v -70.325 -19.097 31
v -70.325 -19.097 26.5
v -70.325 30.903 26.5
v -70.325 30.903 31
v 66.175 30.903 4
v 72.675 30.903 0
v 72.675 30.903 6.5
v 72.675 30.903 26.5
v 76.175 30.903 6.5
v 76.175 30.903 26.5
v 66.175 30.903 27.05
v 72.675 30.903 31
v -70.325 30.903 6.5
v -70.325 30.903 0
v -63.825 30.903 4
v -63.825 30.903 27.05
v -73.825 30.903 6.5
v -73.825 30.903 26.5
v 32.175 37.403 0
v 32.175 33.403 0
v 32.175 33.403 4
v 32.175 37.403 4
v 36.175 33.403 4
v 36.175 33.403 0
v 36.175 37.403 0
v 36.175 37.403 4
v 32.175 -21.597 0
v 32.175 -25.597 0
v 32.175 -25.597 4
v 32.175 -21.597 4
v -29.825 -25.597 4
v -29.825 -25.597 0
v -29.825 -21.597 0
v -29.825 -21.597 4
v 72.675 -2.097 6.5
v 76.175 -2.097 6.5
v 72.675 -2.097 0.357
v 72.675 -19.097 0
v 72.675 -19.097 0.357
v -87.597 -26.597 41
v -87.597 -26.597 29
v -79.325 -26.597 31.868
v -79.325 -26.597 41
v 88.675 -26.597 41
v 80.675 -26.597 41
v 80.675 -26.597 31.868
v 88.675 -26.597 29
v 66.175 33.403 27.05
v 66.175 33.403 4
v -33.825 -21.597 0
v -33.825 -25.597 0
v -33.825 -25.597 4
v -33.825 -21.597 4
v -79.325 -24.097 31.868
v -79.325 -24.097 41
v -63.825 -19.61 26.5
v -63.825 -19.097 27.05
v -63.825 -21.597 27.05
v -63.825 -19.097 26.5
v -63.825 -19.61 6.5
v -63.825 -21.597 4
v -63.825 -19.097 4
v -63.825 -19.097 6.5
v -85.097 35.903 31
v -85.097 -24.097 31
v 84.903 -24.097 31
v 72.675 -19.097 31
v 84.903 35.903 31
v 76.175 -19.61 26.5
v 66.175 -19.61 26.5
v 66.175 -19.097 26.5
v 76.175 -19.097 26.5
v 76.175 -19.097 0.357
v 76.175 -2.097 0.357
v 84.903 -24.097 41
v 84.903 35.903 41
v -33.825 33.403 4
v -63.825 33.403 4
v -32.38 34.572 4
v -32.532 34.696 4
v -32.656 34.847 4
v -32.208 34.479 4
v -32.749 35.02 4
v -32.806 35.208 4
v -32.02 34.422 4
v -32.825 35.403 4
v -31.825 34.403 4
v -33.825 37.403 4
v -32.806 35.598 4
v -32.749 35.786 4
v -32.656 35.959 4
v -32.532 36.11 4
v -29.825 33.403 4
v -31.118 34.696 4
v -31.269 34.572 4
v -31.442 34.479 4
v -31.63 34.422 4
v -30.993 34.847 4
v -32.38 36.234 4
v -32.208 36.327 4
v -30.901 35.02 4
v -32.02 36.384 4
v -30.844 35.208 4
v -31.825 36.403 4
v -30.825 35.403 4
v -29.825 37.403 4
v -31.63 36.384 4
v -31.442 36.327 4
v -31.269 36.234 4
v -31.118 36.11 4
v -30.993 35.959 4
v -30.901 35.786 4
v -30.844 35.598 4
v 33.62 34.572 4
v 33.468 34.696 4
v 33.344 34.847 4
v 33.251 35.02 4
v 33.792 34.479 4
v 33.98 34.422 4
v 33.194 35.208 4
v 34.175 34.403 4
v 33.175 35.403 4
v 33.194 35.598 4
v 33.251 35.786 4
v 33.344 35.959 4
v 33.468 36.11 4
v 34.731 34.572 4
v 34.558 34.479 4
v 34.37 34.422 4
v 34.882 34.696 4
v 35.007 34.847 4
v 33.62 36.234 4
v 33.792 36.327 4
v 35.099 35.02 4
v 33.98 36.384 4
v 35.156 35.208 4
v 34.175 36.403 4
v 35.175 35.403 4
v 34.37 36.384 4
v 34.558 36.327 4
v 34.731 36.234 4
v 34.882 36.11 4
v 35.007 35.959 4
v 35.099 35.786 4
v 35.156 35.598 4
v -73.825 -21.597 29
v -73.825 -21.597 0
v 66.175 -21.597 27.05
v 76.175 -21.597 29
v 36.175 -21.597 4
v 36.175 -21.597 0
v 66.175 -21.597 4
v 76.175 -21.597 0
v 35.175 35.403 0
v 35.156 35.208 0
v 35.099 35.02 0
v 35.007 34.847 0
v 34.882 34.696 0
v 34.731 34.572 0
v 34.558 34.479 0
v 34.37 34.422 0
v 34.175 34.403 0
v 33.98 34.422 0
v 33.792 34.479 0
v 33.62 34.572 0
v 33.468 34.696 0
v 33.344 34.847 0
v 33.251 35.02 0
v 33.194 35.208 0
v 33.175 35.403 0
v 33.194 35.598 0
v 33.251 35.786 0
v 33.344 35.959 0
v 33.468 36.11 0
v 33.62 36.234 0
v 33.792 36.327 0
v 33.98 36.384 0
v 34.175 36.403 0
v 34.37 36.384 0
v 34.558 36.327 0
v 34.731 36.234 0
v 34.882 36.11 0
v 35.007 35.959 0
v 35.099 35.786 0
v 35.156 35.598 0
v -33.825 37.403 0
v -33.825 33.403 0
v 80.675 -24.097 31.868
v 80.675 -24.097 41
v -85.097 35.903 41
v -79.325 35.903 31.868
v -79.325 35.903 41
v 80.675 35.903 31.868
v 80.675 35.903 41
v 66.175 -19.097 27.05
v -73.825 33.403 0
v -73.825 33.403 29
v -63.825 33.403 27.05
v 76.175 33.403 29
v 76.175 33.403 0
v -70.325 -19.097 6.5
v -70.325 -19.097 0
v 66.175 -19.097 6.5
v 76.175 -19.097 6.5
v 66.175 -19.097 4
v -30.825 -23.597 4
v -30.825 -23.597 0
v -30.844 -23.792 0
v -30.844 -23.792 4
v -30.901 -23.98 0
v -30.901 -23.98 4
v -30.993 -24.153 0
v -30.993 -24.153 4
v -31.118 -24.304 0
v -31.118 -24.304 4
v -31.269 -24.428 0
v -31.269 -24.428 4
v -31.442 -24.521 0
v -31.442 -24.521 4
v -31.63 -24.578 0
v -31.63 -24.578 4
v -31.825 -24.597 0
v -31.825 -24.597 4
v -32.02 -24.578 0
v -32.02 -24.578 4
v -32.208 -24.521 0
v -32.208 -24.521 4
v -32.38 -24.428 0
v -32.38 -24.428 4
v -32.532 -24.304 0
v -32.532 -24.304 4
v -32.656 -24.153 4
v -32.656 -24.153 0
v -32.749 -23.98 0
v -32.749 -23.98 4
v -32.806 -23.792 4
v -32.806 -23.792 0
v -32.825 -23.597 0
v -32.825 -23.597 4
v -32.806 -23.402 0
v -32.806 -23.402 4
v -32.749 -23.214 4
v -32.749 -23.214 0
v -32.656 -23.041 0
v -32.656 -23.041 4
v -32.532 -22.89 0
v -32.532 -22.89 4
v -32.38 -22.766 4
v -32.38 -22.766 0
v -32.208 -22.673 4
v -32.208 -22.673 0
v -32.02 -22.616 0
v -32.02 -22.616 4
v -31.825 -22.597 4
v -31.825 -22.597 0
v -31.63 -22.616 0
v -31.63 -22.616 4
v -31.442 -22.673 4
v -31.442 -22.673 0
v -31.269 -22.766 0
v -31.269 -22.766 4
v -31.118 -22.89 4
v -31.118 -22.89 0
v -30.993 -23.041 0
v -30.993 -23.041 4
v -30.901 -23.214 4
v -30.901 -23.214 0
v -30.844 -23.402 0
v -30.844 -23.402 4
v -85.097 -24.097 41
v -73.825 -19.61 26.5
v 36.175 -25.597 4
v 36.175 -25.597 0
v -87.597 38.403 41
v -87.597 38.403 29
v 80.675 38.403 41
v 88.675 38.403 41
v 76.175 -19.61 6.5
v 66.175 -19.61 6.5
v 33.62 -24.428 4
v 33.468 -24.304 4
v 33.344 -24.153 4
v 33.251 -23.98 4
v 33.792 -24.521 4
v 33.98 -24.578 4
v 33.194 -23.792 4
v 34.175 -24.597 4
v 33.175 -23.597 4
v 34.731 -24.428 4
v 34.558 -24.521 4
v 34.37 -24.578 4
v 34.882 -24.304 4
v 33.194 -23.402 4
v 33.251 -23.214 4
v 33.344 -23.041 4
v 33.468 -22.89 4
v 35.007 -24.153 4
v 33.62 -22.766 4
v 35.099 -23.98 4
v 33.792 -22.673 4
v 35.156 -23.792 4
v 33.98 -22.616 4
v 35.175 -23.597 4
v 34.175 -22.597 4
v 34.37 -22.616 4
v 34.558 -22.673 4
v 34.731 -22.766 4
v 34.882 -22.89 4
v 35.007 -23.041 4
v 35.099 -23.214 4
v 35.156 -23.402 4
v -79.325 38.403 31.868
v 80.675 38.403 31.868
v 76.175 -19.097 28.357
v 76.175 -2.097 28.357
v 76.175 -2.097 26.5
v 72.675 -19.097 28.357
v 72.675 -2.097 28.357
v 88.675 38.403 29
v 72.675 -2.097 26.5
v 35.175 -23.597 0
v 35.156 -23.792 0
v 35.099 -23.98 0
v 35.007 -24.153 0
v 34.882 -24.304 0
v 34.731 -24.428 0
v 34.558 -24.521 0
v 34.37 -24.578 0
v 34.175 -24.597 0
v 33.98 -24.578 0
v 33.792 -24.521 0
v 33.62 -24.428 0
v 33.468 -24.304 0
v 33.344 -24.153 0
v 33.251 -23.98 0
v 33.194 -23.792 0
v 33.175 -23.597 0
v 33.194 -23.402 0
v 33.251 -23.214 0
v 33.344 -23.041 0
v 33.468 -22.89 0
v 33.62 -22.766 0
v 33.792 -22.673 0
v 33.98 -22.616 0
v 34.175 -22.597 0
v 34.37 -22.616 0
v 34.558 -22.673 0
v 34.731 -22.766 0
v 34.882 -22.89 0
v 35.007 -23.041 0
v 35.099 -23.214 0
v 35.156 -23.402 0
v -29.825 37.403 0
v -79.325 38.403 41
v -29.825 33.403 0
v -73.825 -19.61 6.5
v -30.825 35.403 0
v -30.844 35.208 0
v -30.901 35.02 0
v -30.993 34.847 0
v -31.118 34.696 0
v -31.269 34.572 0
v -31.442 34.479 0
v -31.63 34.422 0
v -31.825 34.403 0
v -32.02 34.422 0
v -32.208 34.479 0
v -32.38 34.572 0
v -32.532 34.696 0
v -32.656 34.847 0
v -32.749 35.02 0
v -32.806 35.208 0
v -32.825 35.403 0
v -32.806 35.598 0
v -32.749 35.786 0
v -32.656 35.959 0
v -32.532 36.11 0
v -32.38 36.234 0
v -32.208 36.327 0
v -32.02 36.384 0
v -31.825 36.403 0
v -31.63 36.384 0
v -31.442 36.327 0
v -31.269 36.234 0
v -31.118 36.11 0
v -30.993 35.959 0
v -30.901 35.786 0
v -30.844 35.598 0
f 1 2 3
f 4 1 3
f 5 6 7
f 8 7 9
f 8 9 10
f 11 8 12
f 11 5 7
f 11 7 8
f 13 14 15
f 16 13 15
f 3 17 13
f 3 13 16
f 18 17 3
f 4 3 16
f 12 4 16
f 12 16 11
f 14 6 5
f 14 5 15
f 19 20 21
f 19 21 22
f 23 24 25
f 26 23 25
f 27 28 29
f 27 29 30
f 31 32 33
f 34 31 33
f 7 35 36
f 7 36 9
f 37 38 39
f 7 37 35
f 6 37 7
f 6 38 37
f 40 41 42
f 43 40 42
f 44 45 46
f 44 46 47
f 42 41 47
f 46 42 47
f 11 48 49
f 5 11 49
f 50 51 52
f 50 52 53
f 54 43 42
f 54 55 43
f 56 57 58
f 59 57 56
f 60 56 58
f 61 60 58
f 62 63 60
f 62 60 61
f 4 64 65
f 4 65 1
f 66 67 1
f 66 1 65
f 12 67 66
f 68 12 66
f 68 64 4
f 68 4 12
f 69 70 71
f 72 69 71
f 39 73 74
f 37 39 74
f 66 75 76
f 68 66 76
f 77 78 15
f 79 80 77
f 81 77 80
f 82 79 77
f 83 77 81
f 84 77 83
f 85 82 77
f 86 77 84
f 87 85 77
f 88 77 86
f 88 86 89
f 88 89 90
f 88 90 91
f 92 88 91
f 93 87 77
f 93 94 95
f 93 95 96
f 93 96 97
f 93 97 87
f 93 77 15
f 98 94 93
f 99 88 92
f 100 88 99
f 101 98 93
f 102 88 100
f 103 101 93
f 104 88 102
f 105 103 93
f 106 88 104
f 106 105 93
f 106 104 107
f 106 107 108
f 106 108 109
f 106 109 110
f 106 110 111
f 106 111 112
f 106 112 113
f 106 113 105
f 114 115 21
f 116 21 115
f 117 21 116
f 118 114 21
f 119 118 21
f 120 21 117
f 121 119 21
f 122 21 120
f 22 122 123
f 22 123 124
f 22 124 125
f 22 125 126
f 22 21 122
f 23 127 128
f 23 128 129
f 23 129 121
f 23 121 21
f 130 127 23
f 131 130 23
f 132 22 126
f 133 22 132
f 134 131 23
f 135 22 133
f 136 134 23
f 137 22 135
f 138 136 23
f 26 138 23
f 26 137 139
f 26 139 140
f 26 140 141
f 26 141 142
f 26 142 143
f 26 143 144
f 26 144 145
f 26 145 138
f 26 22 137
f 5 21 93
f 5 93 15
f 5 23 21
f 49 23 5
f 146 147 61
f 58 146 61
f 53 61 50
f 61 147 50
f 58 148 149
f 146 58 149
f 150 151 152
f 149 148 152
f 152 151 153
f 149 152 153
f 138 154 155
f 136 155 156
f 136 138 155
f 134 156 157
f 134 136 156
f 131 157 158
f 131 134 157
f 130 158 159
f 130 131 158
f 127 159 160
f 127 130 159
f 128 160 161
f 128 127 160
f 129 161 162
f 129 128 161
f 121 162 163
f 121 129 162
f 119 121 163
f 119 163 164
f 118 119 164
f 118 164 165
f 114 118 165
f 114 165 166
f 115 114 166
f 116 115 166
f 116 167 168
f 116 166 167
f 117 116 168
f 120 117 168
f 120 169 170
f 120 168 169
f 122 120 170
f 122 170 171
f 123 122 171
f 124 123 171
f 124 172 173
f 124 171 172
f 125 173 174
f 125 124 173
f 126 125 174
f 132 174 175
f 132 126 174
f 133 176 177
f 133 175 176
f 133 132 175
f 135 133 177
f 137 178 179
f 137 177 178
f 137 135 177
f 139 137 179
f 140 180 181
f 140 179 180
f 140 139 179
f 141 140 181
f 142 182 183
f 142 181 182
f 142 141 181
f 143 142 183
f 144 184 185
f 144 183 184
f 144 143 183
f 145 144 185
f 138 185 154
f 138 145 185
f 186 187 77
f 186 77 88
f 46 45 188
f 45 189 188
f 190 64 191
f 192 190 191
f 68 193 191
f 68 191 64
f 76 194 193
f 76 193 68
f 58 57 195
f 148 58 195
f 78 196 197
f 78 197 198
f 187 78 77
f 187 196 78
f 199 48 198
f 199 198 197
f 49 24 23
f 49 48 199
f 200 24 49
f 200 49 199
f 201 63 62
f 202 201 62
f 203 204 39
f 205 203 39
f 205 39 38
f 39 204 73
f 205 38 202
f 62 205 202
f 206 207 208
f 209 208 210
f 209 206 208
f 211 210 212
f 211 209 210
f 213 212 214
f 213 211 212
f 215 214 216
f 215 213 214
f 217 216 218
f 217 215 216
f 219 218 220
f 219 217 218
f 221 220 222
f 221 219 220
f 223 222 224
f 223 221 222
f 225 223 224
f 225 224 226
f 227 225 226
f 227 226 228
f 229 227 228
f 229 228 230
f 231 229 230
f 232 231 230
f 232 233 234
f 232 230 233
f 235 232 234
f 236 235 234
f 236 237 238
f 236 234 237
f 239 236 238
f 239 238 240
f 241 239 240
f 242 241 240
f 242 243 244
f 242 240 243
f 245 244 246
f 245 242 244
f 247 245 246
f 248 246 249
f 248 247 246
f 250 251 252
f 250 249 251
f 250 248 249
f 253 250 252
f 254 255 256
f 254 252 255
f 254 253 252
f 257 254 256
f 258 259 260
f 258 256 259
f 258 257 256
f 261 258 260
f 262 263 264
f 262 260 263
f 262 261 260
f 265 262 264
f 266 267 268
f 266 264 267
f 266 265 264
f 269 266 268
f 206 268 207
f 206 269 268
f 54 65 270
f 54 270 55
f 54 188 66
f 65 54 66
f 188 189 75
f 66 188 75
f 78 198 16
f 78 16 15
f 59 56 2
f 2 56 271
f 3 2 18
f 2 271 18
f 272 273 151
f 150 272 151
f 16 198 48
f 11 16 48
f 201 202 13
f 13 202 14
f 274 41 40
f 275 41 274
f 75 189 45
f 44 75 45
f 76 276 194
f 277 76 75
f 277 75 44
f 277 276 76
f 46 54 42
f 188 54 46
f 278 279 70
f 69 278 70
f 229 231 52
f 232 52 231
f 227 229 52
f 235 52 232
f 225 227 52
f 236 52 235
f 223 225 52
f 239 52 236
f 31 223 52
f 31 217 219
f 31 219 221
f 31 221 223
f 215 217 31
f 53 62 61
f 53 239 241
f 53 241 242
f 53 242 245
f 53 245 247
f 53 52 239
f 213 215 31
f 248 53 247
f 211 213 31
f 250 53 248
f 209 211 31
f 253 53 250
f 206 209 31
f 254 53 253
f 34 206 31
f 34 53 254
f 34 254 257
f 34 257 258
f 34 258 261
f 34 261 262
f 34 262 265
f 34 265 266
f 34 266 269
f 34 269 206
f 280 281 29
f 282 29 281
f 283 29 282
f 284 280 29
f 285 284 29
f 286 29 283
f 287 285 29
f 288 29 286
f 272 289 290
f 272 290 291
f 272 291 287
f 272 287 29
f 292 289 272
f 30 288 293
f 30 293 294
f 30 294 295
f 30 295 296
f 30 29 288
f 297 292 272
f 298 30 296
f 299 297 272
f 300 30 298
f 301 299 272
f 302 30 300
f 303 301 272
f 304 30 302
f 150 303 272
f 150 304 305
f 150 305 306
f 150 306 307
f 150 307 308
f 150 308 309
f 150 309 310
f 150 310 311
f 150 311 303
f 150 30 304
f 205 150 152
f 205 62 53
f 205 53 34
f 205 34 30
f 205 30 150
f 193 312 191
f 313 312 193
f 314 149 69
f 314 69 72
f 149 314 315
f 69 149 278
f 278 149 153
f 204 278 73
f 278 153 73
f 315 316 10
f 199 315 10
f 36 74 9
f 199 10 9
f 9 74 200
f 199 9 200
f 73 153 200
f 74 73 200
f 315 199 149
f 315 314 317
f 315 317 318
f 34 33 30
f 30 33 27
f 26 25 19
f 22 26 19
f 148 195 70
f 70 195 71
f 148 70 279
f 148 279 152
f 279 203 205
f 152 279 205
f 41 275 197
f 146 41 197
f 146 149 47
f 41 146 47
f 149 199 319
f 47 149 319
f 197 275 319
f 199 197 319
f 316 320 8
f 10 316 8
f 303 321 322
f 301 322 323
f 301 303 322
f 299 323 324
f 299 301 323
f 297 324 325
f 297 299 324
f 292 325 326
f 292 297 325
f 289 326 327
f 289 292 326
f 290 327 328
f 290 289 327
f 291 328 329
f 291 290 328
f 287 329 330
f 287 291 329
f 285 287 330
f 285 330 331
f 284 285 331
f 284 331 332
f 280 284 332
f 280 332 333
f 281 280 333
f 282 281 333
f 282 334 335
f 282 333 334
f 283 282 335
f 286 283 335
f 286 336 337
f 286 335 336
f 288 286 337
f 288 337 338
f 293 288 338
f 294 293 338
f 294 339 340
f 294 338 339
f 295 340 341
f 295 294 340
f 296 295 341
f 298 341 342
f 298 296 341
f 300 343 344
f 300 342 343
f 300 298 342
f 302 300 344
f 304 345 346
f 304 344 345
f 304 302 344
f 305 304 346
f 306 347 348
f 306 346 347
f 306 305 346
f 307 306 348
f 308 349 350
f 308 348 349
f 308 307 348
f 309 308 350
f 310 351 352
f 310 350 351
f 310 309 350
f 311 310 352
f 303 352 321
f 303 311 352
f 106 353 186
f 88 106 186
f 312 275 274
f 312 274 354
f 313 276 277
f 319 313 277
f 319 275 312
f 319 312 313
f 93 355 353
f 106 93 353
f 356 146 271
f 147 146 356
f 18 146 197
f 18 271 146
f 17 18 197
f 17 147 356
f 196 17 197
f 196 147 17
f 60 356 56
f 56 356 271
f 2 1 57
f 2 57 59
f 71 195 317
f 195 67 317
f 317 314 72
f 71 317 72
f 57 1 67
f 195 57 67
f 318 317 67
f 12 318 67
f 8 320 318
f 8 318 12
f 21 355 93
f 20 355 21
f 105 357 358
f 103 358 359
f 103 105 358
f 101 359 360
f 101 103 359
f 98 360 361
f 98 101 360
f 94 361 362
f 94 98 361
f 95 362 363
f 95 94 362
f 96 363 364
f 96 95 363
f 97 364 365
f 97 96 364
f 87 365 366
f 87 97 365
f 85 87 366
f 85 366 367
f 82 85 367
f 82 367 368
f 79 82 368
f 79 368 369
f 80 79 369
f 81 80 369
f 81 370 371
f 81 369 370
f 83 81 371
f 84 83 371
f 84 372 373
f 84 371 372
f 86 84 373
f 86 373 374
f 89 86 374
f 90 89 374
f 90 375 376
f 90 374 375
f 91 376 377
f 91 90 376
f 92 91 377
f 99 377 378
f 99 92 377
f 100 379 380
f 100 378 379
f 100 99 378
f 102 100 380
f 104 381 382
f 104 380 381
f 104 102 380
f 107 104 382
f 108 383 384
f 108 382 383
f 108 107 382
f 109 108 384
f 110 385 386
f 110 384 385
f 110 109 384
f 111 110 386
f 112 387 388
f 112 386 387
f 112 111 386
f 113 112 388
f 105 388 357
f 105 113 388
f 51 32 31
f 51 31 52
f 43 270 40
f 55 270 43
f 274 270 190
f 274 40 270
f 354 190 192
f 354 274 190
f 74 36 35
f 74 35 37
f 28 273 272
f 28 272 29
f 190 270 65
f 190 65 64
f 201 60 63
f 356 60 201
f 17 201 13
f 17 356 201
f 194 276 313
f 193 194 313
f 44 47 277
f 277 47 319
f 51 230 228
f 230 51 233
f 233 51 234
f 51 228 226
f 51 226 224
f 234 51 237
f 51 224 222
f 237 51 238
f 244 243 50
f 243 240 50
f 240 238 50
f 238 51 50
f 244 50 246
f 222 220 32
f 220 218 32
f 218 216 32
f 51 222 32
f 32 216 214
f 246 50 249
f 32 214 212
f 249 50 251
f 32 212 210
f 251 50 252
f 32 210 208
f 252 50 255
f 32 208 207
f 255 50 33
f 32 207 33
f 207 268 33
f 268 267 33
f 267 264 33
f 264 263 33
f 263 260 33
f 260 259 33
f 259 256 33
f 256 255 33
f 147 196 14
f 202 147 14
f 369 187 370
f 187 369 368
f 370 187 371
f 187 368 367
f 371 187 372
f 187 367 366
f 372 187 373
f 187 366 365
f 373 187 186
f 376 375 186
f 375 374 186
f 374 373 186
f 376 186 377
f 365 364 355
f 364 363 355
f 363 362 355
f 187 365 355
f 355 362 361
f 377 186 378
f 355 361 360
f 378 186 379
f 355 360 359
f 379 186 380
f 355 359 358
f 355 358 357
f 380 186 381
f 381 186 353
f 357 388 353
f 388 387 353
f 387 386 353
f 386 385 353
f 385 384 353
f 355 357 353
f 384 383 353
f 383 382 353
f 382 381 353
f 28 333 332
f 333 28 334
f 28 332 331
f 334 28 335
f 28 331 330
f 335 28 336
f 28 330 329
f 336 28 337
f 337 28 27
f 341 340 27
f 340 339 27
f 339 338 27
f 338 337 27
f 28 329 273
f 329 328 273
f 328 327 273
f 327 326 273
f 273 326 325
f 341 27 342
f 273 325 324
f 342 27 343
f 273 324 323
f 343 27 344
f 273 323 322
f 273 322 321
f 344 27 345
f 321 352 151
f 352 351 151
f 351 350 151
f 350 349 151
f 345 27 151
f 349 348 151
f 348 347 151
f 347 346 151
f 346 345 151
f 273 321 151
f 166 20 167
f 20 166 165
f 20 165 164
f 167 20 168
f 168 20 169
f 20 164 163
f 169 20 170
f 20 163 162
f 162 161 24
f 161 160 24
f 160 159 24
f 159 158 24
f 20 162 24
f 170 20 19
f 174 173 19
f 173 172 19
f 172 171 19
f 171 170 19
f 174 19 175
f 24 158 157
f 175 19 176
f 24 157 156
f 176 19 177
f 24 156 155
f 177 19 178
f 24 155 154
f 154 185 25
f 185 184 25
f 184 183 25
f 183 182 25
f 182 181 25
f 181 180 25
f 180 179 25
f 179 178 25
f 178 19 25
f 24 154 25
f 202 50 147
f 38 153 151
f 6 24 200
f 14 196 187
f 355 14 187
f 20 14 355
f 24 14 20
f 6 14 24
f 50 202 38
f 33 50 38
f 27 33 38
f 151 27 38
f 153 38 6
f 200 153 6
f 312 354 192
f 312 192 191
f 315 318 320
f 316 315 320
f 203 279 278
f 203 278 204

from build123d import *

# Parameters (mm, degrees)
SKETCH1_W               = 150
SKETCH1_H               = 55
SKETCH1_W_2             = 143
SKETCH1_H_2             = 50
BOSS_EXTRUDE1_DEPTH     = 30
CUT_EXTRUDE6_DEPTH      = 46
CUT_EXTRUDE6_DEPTH_BACK = 1
SKETCH2_W               = 170
SKETCH2_H               = 60
SKETCH3_W               = 176.272583165
SKETCH3_H               = 65
BOSS_EXTRUDE3_DEPTH     = 12
SKETCH4_W               = 170
SKETCH4_H               = 60
CUT_EXTRUDE7_DEPTH      = 10
CUT_EXTRUDE8_DEPTH      = 102.484371807
CUT_EXTRUDE8_DEPTH_BACK = 102.484371807
SKETCH5_W               = 143
SKETCH5_H               = 50
SKETCH6_W               = 4
SKETCH6_H               = 4
BOSS_EXTRUDE5_DEPTH     = 4
CUT_EXTRUDE9_DEPTH      = 105.971794883
CUT_EXTRUDE9_DEPTH_BACK = 4
SKETCH7_R               = 1
SKETCH8_W               = 28
SKETCH8_H               = 17
CUT_EXTRUDE12_DEPTH     = 10
SKETCH9_W               = 130
SKETCH9_H               = 23.050427834
CUT_EXTRUDE13_DEPTH     = 72
SKETCH10_W              = 20
SKETCH10_H              = 50.513415504
CUT_EXTRUDE14_DEPTH     = 177
SKETCH11_W              = 160
SKETCH11_H              = 10.657938717
CUT_EXTRUDE15_DEPTH     = 177


with BuildPart() as part:
    # Sketch1 → Boss-Extrude1 (new body)
    with BuildSketch(Plane.XY):
        with Locations((1.175180371, 5.902996071)):
            Rectangle(SKETCH1_W, SKETCH1_H)
        with Locations((1.175180371, 5.902996071)):
            Rectangle(SKETCH1_W_2, SKETCH1_H_2, mode=Mode.SUBTRACT)
    extrude(amount=BOSS_EXTRUDE1_DEPTH)

    # Sketch2 → Cut-Extrude6 (cut, two sides: drawn at the far end of the back side and taken through both)
    with BuildSketch(Plane.XY.offset(30).offset(-CUT_EXTRUDE6_DEPTH_BACK)):
        with Locations((1.175180371, 5.902996071)):
            Rectangle(SKETCH2_W, SKETCH2_H)
    extrude(amount=CUT_EXTRUDE6_DEPTH + CUT_EXTRUDE6_DEPTH_BACK, mode=Mode.SUBTRACT)

    # Sketch3 → Boss-Extrude3 (add)
    with BuildSketch(Plane.XY.offset(29)):
        with Locations((0.538888789, 5.902996071)):
            Rectangle(SKETCH3_W, SKETCH3_H)
    extrude(amount=BOSS_EXTRUDE3_DEPTH)

    # Sketch4 → Cut-Extrude7 (cut)
    with BuildSketch(Plane.XY.offset(41)):
        with Locations((-0.097402794, 5.902996071)):
            Rectangle(SKETCH4_W, SKETCH4_H)
    extrude(amount=-CUT_EXTRUDE7_DEPTH, mode=Mode.SUBTRACT)

    # Sketch5 → Cut-Extrude8 (cut, two sides: drawn at the far end of the back side and taken through both)
    with BuildSketch(Plane.XY.offset(31).offset(-CUT_EXTRUDE8_DEPTH_BACK)):
        with Locations((1.175180371, 5.902996071)):
            Rectangle(SKETCH5_W, SKETCH5_H)
    extrude(amount=CUT_EXTRUDE8_DEPTH + CUT_EXTRUDE8_DEPTH_BACK, mode=Mode.SUBTRACT)

    # Sketch6 → Boss-Extrude5 (add)
    with BuildSketch(Plane(origin=(0, 0, 0), x_dir=(-1, 0, 0), z_dir=(0, 0, -1))):
        with Locations((-34.175180371, -23.597003929)):
            Rectangle(SKETCH6_W, SKETCH6_H)
        with Locations((31.824819629, -23.597003929)):
            Rectangle(SKETCH6_W, SKETCH6_H)
        with Locations((-34.175180371, 35.402996071)):
            Rectangle(SKETCH6_W, SKETCH6_H)
        with Locations((31.824819629, 35.402996071)):
            Rectangle(SKETCH6_W, SKETCH6_H)
    extrude(amount=-BOSS_EXTRUDE5_DEPTH)

    # Sketch7 → Cut-Extrude9 (cut, two sides: drawn at the far end of the back side and taken through both)
    with BuildSketch(Plane(origin=(0, 0, 0), x_dir=(-1, 0, 0), z_dir=(0, 0, -1)).offset(-CUT_EXTRUDE9_DEPTH_BACK)):
        with Locations(Location((-34.175180371, 35.402996071, 0), (0, 0, 180))):
            Circle(SKETCH7_R)
        with Locations(Location((31.824819629, 35.402996071, 0), (0, 0, 180))):
            Circle(SKETCH7_R)
        with Locations(Location((31.824819629, -23.597003929, 0), (0, 0, 180))):
            Circle(SKETCH7_R)
        with Locations(Location((-34.175180371, -23.597003929, 0), (0, 0, 180))):
            Circle(SKETCH7_R)
    extrude(amount=CUT_EXTRUDE9_DEPTH + CUT_EXTRUDE9_DEPTH_BACK, mode=Mode.SUBTRACT)

    # Sketch8 → Cut-Extrude12 (cut)
    with BuildSketch(Plane(origin=(76.175180371, 0, 0), x_dir=(0, 0, -1), z_dir=(1, 0, 0))):
        with Locations((-14.356573147, -10.597003929)):
            Rectangle(SKETCH8_W, SKETCH8_H)
    extrude(amount=-CUT_EXTRUDE12_DEPTH, mode=Mode.SUBTRACT)

    # Sketch9 → Cut-Extrude13 (cut)
    with BuildSketch(Plane(origin=(0, 33.402996071, 0), x_dir=(1, 0, 0), z_dir=(0, 1, 0))):
        with Locations((1.175180371, -15.525213917)):
            Rectangle(SKETCH9_W, SKETCH9_H)
    extrude(amount=-CUT_EXTRUDE13_DEPTH, mode=Mode.SUBTRACT)

    # Sketch10 → Cut-Extrude14 (cut)
    with BuildSketch(Plane.ZY.offset(73.824819629)):
        with Locations((16.5, 5.646288319)):
            Rectangle(SKETCH10_W, SKETCH10_H)
    extrude(amount=-CUT_EXTRUDE14_DEPTH, mode=Mode.SUBTRACT)

    # Sketch11 → Cut-Extrude15 (cut)
    with BuildSketch(Plane(origin=(0, 38.402996071, 0), x_dir=(1, 0, 0), z_dir=(0, 1, 0))):
        with Locations((0.675180371, -37.197220061)):
            Rectangle(SKETCH11_W, SKETCH11_H)
    extrude(amount=-CUT_EXTRUDE15_DEPTH, mode=Mode.SUBTRACT)


solid = part.part
